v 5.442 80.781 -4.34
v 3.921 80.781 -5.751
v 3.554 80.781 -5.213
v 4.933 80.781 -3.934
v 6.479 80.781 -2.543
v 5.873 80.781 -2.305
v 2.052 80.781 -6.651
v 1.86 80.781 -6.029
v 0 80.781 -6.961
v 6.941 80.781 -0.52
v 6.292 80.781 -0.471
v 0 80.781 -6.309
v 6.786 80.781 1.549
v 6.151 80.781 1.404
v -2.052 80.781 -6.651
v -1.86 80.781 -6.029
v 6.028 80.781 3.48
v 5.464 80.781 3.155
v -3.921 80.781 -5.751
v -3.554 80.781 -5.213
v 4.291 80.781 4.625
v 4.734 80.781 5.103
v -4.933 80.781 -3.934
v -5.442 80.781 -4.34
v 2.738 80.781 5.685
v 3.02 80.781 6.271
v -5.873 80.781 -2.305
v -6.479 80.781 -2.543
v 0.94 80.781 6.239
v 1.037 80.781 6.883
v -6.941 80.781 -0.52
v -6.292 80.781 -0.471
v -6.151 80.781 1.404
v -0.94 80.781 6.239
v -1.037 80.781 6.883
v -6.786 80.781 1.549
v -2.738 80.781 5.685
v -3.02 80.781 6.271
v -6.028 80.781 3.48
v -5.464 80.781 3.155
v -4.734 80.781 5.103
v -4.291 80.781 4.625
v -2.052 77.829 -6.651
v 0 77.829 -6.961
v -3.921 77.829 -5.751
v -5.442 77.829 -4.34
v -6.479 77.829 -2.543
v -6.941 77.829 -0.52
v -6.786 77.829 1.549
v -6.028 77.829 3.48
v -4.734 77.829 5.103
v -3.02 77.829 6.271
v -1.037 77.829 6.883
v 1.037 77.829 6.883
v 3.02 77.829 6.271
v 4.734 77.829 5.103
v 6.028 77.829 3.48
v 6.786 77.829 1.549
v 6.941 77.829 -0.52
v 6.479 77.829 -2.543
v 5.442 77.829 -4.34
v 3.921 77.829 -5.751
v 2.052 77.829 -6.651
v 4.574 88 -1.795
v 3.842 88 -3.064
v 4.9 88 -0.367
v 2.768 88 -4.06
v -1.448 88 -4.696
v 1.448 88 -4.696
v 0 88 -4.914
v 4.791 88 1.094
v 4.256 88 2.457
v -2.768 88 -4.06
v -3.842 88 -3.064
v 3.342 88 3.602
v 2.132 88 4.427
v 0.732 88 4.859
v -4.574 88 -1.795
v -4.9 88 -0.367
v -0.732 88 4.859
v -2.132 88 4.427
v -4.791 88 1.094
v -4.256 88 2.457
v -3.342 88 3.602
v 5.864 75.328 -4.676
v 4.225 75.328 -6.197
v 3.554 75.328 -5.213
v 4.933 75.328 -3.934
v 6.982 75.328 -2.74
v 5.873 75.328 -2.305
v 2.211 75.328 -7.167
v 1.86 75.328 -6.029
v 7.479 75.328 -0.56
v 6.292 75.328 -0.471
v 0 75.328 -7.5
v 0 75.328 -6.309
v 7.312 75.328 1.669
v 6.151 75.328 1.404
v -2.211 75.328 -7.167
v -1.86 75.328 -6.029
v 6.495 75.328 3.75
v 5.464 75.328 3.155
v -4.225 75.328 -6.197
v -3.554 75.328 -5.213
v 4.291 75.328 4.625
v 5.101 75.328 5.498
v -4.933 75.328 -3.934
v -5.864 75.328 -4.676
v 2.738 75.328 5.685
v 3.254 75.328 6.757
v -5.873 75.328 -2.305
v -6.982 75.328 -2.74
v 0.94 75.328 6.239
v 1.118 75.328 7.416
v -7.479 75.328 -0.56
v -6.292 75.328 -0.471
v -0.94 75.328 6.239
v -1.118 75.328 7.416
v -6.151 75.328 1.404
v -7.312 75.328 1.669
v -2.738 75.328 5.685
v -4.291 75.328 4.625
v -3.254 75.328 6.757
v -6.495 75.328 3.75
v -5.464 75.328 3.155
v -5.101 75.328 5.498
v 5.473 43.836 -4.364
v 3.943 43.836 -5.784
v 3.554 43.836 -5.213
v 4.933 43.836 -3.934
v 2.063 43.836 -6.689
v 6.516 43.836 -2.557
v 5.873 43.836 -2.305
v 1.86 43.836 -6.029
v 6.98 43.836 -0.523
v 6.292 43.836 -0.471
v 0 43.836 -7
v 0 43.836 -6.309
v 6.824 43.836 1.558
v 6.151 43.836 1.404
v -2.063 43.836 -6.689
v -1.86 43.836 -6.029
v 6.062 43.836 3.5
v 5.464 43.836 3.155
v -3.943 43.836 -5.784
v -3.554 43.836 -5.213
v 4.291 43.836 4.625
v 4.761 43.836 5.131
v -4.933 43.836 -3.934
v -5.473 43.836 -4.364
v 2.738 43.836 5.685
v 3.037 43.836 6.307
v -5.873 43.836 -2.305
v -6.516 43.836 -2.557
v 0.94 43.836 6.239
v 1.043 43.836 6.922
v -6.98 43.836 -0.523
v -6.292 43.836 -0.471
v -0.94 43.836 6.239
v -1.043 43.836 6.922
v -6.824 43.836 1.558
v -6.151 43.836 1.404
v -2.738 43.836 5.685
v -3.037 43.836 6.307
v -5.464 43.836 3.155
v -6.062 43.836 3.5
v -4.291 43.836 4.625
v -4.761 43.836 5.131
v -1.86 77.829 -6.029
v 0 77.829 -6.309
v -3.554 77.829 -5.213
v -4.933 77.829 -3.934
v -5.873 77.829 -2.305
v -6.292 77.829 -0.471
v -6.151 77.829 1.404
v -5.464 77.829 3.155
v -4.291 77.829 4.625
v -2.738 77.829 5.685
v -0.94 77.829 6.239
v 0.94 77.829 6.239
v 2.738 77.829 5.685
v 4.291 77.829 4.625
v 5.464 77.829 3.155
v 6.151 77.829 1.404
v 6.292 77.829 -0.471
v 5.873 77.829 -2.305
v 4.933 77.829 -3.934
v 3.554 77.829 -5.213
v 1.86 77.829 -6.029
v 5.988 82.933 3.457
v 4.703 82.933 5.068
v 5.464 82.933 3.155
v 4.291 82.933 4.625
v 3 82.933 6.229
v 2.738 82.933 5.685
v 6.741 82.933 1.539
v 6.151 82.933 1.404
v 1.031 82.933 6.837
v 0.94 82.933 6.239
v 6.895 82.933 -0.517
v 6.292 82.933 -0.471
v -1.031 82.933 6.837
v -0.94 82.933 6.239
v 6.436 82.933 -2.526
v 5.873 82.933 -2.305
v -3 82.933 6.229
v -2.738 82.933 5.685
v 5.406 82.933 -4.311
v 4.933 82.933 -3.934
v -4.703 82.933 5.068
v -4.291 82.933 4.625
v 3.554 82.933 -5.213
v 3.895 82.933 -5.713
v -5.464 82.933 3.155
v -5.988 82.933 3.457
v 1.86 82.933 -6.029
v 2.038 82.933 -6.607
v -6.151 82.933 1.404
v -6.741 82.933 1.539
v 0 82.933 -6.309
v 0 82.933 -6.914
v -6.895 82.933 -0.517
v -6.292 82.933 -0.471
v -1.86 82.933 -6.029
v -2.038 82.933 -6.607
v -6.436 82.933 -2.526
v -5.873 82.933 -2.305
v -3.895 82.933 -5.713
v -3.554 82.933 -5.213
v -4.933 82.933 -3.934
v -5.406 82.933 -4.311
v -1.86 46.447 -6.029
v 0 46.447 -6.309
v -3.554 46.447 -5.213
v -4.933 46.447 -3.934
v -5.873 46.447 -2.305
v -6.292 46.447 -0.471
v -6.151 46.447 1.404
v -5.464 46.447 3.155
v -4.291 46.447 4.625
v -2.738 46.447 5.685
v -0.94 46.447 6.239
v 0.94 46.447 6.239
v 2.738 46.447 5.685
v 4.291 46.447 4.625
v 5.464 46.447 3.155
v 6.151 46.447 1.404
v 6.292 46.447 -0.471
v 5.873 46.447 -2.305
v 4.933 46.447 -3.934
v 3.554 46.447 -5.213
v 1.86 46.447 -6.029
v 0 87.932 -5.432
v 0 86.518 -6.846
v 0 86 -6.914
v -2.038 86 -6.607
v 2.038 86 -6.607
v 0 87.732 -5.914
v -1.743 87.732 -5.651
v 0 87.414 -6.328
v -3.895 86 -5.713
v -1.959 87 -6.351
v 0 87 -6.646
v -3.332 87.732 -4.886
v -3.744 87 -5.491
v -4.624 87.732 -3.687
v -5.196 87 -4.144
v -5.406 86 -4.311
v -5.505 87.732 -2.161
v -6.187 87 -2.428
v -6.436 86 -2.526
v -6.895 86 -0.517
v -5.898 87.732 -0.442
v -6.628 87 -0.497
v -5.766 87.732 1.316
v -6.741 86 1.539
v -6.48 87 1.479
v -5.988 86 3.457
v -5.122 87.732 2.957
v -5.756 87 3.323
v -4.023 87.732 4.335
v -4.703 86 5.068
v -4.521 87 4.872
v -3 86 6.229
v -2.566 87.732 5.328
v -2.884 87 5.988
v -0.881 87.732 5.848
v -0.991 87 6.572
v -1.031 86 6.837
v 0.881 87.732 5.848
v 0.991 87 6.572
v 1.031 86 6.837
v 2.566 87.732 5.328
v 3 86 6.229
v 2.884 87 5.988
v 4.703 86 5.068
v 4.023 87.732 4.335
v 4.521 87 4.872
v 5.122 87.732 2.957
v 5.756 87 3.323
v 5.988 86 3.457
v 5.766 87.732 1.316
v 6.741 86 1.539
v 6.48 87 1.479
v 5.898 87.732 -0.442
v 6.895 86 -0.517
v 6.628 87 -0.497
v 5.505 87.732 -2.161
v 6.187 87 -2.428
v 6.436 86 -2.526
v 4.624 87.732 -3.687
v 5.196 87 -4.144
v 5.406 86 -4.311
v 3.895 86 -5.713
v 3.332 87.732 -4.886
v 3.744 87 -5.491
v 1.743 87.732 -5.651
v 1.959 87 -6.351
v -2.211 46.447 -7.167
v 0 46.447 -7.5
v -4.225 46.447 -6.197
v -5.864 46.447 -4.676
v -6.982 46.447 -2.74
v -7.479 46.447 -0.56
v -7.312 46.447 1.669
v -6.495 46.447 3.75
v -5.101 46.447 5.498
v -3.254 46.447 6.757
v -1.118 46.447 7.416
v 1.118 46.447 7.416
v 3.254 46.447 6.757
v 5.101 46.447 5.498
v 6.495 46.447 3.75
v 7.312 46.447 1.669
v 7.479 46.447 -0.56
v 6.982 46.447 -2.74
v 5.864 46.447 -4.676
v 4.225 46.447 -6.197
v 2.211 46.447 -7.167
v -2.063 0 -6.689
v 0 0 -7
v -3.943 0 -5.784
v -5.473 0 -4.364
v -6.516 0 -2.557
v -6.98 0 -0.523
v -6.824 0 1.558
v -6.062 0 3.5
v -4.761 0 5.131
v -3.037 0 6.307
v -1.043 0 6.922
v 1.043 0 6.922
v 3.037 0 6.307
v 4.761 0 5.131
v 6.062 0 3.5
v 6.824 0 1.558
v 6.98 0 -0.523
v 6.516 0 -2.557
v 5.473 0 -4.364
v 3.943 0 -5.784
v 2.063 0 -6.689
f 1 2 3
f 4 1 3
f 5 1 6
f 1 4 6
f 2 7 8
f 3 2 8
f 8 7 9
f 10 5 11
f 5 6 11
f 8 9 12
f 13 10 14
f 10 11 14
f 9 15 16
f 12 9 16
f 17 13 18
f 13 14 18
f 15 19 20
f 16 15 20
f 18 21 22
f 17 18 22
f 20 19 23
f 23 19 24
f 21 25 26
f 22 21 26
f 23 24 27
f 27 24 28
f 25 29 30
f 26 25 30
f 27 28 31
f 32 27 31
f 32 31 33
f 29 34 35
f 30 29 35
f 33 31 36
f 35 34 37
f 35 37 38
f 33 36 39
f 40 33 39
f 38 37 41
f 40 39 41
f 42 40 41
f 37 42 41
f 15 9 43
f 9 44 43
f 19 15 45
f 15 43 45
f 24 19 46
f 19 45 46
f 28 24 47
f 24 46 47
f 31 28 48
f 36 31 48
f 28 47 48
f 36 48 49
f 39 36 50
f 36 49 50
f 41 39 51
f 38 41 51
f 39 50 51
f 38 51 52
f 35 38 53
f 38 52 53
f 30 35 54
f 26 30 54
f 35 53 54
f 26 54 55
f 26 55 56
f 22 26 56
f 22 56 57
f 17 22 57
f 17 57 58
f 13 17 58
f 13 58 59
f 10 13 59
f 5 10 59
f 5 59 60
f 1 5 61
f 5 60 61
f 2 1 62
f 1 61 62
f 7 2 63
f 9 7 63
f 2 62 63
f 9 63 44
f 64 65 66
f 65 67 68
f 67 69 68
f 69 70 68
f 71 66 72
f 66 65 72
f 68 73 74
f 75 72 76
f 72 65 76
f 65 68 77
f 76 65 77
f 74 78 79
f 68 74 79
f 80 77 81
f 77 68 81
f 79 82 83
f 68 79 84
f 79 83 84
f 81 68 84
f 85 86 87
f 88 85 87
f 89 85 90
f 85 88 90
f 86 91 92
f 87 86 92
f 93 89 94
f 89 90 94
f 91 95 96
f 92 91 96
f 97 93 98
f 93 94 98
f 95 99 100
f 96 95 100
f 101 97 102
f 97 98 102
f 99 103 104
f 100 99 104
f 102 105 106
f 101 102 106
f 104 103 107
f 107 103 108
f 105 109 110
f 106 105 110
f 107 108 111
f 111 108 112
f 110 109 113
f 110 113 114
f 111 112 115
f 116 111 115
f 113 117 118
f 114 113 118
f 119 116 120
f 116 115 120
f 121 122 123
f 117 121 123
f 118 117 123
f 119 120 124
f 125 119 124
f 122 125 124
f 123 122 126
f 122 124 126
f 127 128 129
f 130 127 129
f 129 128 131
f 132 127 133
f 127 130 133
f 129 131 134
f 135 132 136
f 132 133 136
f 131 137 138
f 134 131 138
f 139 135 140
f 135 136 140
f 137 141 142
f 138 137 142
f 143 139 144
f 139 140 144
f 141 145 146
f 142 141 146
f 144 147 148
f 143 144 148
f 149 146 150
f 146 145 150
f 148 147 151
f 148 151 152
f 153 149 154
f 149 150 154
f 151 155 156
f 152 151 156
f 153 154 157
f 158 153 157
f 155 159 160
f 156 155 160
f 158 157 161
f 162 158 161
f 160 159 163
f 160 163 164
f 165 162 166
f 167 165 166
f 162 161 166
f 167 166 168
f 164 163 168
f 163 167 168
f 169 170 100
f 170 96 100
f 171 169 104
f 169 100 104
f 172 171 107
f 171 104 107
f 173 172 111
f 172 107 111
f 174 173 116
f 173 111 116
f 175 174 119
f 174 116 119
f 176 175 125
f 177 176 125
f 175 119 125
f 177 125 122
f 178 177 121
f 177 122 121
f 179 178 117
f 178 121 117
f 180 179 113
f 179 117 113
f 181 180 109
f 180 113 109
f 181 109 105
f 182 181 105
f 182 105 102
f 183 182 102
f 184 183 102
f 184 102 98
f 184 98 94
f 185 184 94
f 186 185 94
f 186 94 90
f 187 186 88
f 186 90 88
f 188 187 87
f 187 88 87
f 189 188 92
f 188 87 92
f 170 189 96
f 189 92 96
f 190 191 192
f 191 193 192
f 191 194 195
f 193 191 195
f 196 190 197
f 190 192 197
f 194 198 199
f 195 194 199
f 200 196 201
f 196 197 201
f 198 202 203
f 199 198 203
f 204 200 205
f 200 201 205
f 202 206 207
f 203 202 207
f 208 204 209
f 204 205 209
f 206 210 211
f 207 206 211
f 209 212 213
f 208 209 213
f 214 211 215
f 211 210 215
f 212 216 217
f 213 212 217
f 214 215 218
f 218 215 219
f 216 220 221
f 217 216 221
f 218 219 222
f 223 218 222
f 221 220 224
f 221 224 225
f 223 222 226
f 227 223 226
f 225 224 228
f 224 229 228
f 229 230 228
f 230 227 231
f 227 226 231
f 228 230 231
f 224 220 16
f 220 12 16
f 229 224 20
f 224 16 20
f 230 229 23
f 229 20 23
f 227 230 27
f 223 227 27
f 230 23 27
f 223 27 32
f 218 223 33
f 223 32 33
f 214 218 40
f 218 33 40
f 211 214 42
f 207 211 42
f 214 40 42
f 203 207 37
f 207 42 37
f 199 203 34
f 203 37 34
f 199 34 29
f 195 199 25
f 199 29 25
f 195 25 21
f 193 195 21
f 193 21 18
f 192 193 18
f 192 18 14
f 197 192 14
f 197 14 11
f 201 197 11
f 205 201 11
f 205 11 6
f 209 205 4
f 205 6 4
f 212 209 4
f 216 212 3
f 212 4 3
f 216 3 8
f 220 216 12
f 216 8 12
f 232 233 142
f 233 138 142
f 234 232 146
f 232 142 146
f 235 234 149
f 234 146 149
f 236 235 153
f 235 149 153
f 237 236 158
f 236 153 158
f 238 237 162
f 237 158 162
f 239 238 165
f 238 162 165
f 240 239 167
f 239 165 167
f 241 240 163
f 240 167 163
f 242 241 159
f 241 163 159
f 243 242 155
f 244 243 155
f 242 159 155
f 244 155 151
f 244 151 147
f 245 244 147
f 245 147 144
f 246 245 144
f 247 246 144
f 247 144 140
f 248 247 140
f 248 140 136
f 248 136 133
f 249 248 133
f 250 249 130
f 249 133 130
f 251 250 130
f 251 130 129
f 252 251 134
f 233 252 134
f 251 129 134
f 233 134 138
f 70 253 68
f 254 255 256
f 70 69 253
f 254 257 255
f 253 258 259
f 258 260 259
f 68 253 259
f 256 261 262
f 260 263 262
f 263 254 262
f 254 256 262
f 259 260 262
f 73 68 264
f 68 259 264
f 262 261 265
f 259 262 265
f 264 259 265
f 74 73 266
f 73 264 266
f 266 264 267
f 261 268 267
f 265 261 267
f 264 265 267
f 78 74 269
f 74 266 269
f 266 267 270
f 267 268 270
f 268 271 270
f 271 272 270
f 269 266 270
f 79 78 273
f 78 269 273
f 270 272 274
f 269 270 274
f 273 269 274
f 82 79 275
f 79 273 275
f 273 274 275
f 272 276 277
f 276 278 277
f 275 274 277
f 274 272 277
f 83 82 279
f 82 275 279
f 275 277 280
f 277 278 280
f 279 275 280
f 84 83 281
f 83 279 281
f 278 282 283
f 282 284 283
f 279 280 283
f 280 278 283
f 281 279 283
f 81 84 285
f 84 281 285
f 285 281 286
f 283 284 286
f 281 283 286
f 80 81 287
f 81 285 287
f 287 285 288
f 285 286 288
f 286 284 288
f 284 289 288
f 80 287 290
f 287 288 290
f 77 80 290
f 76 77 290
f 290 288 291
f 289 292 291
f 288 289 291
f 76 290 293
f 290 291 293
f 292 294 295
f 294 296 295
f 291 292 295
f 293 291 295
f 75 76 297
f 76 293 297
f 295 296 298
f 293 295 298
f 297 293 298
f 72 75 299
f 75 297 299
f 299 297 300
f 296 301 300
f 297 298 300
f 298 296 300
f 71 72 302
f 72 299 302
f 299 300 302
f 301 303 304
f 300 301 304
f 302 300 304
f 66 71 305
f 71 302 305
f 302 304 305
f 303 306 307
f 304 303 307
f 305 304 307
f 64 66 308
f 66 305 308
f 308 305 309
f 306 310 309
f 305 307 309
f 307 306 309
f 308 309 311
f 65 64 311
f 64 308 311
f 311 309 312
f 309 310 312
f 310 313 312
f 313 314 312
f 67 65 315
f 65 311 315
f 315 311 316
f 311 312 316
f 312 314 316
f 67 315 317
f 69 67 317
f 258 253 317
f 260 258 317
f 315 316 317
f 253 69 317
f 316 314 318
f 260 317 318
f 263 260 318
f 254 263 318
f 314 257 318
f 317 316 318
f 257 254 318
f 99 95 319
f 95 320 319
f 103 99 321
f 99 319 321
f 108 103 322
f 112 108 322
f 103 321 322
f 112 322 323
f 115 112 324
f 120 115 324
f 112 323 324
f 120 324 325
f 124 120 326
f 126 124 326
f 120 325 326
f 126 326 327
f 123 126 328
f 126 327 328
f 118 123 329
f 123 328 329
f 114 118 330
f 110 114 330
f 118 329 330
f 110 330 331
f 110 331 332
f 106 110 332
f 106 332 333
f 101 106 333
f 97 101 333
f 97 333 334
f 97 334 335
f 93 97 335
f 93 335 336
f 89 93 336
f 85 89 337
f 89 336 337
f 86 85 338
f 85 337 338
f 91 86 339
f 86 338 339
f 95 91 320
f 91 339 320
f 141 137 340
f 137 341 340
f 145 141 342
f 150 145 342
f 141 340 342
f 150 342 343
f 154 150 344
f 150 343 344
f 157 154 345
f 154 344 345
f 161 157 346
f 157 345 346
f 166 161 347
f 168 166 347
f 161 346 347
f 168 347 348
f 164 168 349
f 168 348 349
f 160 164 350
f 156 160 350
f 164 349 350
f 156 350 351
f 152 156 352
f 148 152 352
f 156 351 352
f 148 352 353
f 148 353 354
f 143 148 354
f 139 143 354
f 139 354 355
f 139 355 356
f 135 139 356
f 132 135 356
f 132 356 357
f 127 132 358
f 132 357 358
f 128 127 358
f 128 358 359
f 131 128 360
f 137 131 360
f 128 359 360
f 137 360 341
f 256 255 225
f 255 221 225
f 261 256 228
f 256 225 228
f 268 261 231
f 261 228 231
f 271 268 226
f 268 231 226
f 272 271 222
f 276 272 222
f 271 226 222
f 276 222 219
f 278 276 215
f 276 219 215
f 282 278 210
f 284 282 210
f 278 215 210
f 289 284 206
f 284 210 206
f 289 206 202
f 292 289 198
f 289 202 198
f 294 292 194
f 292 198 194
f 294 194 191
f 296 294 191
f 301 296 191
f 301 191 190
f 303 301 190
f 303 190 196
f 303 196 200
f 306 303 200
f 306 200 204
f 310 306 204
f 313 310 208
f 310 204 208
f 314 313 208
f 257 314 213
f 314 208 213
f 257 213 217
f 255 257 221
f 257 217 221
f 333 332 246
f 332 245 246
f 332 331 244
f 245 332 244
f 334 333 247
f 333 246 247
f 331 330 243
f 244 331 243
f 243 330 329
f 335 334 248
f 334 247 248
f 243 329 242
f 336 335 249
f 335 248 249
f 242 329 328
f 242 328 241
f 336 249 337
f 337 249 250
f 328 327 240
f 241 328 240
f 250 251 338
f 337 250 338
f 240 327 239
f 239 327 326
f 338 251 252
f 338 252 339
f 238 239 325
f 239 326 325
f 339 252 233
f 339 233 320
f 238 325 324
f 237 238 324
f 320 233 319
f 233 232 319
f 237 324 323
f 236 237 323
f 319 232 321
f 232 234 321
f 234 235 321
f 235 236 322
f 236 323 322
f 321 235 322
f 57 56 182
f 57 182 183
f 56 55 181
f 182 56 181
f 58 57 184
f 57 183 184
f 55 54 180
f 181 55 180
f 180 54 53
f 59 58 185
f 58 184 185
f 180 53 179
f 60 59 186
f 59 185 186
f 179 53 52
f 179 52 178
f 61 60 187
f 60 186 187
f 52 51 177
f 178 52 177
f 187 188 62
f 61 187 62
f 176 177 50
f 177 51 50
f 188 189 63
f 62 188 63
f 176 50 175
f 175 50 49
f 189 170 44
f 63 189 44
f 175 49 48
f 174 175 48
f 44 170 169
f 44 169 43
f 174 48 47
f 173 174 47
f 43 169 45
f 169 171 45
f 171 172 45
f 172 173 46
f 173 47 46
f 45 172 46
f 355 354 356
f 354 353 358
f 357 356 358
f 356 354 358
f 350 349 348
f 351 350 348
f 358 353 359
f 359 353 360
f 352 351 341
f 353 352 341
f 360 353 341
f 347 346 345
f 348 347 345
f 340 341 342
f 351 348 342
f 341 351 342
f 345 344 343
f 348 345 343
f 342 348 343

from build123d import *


with BuildPart() as part:
    # 草图1 → 旋转4 (revolve)
    with BuildSketch(Plane(origin=(0, 0, 0), x_dir=(0, 0, -1), z_dir=(1, 0, 0)), mode=Mode.PRIVATE) as revolve_4_sk:
        with BuildLine():
            Line((-7, 0), (0, 0))
            Line((0, 0), (0, 88))
            Line((0, 88), (-4.914147633, 88))
            ThreePointArc((-4.914147633, 88), (-6.328361195, 87.414213562), (-6.914147633, 86))
            Line((-6.914147633, 86), (-6.914147633, 82.933330123))
            Line((-6.914147633, 82.933330123), (-6.309364611, 82.933330123))
            Line((-6.309364611, 82.933330123), (-6.309364611, 80.780984357))
            Line((-6.309364611, 80.780984357), (-6.960648153, 80.780984357))
            Line((-6.960648153, 80.780984357), (-6.960648153, 77.82908336))
            Line((-6.960648153, 77.82908336), (-6.309364611, 77.82908336))
            Line((-6.309364611, 77.82908336), (-6.309364611, 75.328381362))
            Line((-6.309364611, 75.328381362), (-7.5, 75.328381362))
            Line((-7.5, 75.328381362), (-7.5, 46.447151695))
            Line((-7.5, 46.447151695), (-6.309364611, 46.447151695))
            Line((-6.309364611, 46.447151695), (-6.309364611, 43.835644878))
            Line((-6.309364611, 43.835644878), (-7, 43.835644878))
            Line((-7, 43.835644878), (-7, 0))
        make_face()
    revolve(revolve_4_sk.sketch.rotate(Axis((0, 0, 0), (0, 1, 0)), 180), axis=Axis((0, 0, 0), (0, 1, 0)))


solid = part.part
